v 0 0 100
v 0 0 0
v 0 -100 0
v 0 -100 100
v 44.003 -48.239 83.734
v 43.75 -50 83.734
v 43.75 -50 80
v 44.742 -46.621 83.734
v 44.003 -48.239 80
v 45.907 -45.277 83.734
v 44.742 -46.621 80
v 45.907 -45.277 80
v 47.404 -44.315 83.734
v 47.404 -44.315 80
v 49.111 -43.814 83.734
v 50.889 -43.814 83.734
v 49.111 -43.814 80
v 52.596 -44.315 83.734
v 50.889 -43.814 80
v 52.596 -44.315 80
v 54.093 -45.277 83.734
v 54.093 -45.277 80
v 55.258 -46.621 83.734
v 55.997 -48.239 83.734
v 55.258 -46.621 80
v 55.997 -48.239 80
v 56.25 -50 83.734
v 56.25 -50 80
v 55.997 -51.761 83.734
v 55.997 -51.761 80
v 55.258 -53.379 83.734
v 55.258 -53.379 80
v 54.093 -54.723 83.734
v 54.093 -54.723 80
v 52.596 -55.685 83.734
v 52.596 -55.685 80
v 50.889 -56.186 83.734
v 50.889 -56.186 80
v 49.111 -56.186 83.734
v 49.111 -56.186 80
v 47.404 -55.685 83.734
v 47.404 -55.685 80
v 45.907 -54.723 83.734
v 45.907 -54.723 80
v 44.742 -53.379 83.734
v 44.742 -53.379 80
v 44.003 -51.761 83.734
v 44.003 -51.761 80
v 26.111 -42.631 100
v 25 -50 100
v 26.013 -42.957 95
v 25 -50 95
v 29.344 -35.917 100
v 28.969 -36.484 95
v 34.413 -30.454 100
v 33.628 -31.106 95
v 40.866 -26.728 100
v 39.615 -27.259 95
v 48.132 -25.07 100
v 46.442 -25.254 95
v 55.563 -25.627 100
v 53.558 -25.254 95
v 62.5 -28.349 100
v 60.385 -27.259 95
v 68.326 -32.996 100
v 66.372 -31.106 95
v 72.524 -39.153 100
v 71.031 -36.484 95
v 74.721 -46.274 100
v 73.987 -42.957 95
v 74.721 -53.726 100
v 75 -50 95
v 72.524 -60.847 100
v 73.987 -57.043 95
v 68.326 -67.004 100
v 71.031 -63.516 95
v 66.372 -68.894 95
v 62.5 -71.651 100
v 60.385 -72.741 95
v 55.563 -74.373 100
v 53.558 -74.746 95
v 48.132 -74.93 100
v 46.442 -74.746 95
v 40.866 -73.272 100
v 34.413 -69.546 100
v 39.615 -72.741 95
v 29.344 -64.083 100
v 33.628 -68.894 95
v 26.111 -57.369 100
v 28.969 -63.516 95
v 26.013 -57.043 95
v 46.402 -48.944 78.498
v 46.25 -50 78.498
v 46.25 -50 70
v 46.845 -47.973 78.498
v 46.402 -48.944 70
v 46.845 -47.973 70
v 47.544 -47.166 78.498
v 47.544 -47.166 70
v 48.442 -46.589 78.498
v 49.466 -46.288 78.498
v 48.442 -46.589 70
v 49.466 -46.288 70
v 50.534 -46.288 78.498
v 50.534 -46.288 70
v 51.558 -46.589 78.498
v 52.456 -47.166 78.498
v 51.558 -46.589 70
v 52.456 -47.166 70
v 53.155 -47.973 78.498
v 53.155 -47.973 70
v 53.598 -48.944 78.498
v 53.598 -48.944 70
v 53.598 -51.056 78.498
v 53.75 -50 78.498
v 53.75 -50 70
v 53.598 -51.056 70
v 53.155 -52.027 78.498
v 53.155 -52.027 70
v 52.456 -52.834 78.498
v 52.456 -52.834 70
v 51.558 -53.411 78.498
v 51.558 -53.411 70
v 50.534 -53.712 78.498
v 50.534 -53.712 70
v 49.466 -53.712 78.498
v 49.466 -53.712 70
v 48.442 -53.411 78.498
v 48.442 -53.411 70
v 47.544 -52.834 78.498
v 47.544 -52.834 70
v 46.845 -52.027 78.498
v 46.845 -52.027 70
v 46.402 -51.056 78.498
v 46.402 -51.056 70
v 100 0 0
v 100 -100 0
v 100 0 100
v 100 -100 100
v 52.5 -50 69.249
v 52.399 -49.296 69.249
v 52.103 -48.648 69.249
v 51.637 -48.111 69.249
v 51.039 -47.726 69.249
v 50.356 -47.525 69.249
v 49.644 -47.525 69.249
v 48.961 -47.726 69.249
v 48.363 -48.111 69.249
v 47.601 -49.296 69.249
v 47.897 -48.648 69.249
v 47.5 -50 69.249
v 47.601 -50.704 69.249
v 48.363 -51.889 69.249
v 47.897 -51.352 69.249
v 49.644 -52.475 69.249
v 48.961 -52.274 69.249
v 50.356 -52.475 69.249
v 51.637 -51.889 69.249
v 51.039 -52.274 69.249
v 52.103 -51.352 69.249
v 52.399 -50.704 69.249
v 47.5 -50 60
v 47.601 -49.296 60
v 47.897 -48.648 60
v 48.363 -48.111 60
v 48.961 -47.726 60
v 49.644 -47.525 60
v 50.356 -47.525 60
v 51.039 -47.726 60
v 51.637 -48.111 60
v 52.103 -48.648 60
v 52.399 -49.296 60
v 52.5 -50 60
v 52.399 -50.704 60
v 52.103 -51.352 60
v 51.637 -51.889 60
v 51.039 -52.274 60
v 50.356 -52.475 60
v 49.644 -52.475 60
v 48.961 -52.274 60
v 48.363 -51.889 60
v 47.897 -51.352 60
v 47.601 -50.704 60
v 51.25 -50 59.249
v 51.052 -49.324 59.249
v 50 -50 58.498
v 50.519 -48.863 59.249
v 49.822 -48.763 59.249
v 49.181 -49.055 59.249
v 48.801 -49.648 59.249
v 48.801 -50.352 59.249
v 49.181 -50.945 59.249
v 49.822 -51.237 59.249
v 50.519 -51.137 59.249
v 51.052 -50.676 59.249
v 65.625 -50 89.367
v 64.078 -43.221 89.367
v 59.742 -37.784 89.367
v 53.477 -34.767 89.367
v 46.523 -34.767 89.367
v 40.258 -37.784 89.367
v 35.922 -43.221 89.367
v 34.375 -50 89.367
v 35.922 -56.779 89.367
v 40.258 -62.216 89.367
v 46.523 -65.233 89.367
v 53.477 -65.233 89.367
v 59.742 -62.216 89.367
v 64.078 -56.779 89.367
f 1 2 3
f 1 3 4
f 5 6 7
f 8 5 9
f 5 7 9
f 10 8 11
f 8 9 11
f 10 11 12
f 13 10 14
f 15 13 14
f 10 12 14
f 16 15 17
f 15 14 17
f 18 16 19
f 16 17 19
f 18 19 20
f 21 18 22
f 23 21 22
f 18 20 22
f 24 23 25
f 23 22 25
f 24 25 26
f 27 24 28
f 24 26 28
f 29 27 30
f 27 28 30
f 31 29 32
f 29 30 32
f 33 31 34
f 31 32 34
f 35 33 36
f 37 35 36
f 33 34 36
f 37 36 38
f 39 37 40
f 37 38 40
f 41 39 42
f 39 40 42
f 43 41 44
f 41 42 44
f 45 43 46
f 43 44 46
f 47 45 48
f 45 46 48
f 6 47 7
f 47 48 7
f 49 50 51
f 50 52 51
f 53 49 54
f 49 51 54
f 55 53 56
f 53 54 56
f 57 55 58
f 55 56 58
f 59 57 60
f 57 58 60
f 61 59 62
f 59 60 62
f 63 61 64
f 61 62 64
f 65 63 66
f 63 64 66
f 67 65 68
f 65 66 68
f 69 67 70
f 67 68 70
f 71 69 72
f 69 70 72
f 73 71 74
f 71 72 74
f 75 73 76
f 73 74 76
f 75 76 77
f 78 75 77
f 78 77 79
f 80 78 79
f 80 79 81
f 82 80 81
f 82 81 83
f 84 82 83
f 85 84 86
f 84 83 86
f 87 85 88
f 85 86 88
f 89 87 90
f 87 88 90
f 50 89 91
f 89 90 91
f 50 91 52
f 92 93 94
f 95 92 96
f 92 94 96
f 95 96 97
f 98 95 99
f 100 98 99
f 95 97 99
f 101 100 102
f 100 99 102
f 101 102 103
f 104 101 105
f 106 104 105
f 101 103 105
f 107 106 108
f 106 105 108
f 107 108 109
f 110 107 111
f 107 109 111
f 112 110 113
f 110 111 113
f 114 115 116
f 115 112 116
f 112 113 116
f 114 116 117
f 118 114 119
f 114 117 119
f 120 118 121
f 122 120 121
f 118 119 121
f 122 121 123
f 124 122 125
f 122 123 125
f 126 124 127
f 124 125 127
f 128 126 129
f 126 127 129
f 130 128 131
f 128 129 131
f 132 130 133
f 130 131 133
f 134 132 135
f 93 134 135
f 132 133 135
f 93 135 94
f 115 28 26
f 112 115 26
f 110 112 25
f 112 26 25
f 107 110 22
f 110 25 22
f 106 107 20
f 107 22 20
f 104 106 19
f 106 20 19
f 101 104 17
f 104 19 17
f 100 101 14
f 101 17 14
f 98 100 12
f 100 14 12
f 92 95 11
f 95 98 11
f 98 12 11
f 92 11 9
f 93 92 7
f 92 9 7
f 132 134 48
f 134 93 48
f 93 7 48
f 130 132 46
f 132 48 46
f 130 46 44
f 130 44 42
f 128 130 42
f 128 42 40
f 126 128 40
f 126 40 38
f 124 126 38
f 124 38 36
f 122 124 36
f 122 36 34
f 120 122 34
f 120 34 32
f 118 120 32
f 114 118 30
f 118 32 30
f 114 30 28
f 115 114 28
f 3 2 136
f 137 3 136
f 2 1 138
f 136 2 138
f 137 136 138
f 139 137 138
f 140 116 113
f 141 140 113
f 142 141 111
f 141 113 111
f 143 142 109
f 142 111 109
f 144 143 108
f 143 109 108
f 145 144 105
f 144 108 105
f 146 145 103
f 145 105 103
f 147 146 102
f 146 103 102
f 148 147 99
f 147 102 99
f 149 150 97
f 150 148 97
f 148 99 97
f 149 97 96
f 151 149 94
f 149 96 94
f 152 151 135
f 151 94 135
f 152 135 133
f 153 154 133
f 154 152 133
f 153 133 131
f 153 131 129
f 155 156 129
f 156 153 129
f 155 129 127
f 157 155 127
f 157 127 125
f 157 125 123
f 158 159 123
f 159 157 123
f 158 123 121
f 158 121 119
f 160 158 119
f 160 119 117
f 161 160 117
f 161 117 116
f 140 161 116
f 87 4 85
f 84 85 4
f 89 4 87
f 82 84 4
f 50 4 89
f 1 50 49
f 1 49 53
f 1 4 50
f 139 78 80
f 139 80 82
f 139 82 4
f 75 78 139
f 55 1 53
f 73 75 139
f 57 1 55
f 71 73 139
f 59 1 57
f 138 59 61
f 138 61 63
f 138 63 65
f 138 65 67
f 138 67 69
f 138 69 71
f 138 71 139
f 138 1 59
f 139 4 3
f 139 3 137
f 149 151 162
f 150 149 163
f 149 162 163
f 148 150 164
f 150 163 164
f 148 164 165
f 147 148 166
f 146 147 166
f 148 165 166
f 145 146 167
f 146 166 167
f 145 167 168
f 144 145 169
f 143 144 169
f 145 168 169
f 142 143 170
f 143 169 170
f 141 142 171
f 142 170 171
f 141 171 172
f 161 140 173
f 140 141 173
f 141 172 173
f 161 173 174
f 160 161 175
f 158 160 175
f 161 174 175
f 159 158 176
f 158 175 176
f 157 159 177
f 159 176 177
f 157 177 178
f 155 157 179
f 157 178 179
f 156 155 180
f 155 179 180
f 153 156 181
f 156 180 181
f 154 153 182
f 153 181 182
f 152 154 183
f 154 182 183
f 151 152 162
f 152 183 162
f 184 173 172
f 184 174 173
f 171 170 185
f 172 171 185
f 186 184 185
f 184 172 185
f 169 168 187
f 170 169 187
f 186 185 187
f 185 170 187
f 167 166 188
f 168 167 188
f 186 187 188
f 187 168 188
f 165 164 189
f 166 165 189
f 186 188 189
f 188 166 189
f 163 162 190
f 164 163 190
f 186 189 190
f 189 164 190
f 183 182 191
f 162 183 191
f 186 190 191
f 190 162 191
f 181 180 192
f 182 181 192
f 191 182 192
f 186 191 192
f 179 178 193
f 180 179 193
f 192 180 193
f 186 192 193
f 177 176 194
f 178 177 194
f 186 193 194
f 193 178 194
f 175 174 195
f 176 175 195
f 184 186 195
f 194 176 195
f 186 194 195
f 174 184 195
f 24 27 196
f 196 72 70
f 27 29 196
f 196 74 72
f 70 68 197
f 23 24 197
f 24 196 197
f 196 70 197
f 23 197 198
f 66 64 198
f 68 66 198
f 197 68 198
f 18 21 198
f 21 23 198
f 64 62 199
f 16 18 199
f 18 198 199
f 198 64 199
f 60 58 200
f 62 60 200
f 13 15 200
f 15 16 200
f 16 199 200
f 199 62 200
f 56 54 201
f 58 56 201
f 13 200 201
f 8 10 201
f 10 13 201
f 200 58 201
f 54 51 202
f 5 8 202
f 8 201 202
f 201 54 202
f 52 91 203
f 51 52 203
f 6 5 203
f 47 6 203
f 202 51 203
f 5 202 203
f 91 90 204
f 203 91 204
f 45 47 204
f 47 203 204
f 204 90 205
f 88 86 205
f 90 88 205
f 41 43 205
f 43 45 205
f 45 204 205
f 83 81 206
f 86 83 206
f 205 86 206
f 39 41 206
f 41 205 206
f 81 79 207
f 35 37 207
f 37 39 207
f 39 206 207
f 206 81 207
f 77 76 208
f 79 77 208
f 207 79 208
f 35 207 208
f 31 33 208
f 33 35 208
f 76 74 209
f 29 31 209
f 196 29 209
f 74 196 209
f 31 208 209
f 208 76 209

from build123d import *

# Parameters (mm, degrees)
F0_W     = 100
F0_H     = 100
F1_DEPTH = 100
F3_D     = 5
F3_DEPTH = 40
F3_TIP   = 1.5021515476
F4_D     = 7.5
F4_DEPTH = 30
F4_TIP   = 2.2532273214
F5_D     = 12.5
F5_DEPTH = 20
F5_TIP   = 3.7553788689
F6_D     = 15
F6_DEPTH = 10
F6_TIP   = 4.5064546427
F7_D     = 30
F7_DEPTH = 5
F7_TIP   = 9.0129092854
F8_D     = 50
F8_DEPTH = 5
F8_TIP   = 15.0215154757


with BuildPart() as f1:
    # F0 (on Front) → F1 (new body)
    with BuildSketch(Plane.XZ):
        with Locations((50, 50)):
            Rectangle(F0_W, F0_H)
    extrude(amount=F1_DEPTH)

    # F3
    with Locations(Plane.XY.offset(100)):
        with Locations((50, -50)):
            Hole(F3_D / 2, depth=F3_DEPTH)
            with Locations((0, 0, -(F3_DEPTH + F3_TIP / 2))):  # 118° drill point
                Cone(0, F3_D / 2, F3_TIP, mode=Mode.SUBTRACT)

    # F4
    with Locations(Plane.XY.offset(100)):
        with Locations((50, -50)):
            Hole(F4_D / 2, depth=F4_DEPTH)
            with Locations((0, 0, -(F4_DEPTH + F4_TIP / 2))):  # 118° drill point
                Cone(0, F4_D / 2, F4_TIP, mode=Mode.SUBTRACT)

    # F5
    with Locations(Plane.XY.offset(100)):
        with Locations((50, -50)):
            Hole(F5_D / 2, depth=F5_DEPTH)
            with Locations((0, 0, -(F5_DEPTH + F5_TIP / 2))):  # 118° drill point
                Cone(0, F5_D / 2, F5_TIP, mode=Mode.SUBTRACT)

    # F6
    with Locations(Plane.XY.offset(100)):
        with Locations((50, -50)):
            Hole(F6_D / 2, depth=F6_DEPTH)
            with Locations((0, 0, -(F6_DEPTH + F6_TIP / 2))):  # 118° drill point
                Cone(0, F6_D / 2, F6_TIP, mode=Mode.SUBTRACT)

    # F7
    with Locations(Plane.XY.offset(100)):
        with Locations((50, -50)):
            Hole(F7_D / 2, depth=F7_DEPTH)
            with Locations((0, 0, -(F7_DEPTH + F7_TIP / 2))):  # 118° drill point
                Cone(0, F7_D / 2, F7_TIP, mode=Mode.SUBTRACT)

    # F8
    with Locations(Plane.XY.offset(100)):
        with Locations((50, -50)):
            Hole(F8_D / 2, depth=F8_DEPTH)
            with Locations((0, 0, -(F8_DEPTH + F8_TIP / 2))):  # 118° drill point
                Cone(0, F8_D / 2, F8_TIP, mode=Mode.SUBTRACT)


solid = f1.part
